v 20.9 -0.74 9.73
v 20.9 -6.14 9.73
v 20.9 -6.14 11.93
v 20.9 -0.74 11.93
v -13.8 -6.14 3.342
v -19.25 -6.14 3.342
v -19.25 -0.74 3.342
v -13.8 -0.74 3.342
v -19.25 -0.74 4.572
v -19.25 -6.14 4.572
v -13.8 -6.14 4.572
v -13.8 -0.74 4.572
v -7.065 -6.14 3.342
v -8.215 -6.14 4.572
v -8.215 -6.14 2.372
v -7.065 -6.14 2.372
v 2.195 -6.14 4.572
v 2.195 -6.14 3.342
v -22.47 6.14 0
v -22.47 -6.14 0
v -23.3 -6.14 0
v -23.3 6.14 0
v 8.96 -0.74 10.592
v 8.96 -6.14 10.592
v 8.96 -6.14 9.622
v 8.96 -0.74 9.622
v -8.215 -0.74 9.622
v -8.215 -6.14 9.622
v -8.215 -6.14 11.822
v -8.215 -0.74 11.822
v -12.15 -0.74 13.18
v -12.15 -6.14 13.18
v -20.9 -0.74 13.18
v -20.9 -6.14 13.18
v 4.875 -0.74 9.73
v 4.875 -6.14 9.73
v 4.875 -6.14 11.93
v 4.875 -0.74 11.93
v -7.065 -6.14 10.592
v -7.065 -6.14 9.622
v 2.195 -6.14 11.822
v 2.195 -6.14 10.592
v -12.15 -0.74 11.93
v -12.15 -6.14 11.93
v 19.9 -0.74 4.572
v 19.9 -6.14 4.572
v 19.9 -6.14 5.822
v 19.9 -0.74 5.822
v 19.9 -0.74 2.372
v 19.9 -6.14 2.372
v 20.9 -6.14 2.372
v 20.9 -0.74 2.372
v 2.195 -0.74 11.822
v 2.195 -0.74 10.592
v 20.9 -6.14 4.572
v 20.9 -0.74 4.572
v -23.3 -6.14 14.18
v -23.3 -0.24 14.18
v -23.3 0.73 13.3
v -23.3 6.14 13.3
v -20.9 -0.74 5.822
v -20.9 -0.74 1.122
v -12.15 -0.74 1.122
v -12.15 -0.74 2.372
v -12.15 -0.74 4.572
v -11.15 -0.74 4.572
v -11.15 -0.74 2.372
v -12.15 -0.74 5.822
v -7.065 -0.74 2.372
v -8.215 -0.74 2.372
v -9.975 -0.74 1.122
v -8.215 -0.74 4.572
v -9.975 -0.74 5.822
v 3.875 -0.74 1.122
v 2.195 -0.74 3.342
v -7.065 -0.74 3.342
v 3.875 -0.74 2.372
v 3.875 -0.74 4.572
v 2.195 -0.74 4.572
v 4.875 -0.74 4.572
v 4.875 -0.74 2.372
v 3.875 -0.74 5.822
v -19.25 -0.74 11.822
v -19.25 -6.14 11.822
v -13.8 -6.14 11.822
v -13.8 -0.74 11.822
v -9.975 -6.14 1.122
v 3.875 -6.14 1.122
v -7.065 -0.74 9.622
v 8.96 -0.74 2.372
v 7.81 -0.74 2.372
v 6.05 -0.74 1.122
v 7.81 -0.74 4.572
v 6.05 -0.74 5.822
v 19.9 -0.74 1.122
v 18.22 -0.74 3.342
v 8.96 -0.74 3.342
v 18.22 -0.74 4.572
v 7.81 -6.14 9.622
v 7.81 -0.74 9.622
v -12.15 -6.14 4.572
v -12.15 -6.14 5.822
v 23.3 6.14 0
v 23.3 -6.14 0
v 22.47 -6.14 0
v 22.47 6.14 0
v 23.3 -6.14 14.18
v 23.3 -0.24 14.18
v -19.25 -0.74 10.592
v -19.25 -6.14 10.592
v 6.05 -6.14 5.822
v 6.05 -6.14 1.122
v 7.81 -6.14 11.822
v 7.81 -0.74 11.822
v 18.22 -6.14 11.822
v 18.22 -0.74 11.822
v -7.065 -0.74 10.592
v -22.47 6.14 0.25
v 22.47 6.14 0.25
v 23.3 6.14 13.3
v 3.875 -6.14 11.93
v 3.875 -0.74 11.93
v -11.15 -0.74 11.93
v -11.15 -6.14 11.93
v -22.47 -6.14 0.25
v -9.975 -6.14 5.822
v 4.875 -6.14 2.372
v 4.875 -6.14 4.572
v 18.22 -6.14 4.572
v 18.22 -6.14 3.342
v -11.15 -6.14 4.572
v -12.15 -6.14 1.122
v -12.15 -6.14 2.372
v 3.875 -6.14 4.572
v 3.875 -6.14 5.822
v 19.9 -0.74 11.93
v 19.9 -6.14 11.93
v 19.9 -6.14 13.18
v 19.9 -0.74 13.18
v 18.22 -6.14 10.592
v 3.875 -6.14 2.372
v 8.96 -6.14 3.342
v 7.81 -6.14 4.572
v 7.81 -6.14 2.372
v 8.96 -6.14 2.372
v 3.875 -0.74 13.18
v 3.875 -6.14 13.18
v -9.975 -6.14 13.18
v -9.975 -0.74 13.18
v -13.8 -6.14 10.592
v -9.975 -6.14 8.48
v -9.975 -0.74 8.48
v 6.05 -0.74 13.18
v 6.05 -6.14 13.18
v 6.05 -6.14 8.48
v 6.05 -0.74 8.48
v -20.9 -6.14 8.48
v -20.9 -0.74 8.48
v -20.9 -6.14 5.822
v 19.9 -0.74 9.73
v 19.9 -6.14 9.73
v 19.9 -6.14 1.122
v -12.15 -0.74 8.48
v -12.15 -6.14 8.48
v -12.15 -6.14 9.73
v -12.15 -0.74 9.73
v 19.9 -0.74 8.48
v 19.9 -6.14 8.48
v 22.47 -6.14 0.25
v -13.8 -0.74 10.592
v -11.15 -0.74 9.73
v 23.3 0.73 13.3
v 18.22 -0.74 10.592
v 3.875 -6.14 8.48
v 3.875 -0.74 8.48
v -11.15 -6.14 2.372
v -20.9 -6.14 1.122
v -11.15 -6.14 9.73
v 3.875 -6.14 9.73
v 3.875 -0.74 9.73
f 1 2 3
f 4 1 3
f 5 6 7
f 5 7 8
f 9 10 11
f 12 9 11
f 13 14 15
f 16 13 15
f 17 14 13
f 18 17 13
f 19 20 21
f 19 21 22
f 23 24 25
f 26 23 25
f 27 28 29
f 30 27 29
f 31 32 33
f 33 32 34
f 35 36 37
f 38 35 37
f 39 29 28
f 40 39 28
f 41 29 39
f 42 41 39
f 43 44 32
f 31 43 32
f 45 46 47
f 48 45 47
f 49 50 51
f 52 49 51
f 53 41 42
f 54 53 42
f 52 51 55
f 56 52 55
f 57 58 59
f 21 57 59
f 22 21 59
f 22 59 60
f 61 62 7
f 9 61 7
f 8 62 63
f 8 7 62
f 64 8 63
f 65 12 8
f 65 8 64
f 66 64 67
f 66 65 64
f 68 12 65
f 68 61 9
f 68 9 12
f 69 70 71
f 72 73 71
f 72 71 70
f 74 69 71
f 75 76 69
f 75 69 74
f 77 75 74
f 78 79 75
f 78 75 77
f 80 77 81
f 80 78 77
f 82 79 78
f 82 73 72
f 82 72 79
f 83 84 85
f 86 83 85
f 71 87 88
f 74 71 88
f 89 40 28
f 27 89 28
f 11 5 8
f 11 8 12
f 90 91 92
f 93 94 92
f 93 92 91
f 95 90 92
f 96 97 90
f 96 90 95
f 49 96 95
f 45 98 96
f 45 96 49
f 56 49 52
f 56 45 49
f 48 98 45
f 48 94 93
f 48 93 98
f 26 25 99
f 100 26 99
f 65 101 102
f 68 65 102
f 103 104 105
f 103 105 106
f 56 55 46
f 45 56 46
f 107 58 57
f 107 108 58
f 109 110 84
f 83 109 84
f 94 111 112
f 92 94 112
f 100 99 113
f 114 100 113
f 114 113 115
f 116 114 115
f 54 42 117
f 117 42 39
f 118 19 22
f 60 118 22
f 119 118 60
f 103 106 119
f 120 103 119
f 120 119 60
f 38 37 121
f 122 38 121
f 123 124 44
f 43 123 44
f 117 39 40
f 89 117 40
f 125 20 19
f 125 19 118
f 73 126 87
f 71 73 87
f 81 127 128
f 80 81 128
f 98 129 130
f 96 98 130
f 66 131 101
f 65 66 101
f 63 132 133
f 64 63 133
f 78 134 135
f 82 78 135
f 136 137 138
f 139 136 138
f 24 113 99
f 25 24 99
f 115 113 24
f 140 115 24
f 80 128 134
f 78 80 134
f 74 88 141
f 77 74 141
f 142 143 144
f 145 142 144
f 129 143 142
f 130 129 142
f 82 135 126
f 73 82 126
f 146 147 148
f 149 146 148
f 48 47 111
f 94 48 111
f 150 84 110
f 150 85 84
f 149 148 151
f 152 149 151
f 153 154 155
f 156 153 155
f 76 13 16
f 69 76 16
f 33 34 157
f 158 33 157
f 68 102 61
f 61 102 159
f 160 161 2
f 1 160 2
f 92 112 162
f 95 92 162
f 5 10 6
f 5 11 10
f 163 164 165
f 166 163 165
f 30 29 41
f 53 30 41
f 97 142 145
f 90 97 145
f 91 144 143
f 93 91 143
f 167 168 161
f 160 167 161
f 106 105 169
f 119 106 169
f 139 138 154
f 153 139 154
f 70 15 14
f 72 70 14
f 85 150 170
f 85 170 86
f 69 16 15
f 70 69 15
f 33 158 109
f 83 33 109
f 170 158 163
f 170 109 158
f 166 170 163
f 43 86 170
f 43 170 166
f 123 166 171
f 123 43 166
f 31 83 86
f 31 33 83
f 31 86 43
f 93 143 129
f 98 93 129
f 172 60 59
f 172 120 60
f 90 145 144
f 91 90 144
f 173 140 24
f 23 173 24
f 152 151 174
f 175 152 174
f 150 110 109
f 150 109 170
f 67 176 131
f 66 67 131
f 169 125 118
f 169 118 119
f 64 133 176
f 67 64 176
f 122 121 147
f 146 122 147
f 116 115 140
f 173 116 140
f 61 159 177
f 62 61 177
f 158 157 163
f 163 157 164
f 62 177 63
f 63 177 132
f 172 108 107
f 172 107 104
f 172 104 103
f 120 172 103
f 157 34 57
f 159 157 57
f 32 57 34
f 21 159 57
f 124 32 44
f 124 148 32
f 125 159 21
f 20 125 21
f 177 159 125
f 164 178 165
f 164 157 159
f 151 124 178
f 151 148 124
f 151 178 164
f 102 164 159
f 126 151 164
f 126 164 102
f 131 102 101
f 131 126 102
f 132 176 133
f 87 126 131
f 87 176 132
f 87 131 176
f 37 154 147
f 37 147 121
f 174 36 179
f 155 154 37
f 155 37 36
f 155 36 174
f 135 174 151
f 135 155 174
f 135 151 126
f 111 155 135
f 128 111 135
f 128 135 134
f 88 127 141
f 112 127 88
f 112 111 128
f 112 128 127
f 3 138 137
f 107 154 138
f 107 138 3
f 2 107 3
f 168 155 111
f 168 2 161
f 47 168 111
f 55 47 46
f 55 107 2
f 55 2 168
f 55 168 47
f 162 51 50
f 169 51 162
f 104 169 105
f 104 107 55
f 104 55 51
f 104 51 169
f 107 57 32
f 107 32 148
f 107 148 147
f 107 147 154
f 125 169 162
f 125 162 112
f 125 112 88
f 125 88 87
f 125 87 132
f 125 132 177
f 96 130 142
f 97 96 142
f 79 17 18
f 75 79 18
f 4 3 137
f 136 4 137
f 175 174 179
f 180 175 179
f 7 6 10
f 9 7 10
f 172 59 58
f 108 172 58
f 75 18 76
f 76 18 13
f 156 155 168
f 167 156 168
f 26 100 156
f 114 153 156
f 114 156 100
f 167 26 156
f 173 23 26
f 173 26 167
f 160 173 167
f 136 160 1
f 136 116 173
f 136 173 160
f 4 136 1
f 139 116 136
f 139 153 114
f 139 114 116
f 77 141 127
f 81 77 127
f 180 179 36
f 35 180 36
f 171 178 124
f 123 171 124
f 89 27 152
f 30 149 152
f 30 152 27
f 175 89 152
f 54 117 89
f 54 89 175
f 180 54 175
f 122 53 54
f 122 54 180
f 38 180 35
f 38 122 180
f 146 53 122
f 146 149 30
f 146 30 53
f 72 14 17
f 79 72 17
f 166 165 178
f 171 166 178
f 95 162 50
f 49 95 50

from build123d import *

# Parameters (mm, degrees)
F1_DEPTH = 23.3
F2_W     = 44.94
F2_H     = 0.25
F3_DEPTH = 12.281
F4_W     = 5.45
F4_H     = 1.23
F5_DEPTH = 5.4


with BuildPart() as f1:
    # F0 (on Right) → F1 (new body, symmetric)
    with BuildSketch(Plane.YZ):
        Polygon((-0.24, 14.18), (-6.14, 14.18), (-6.14, 0), (6.14, 0), (6.14, 13.3), (0.73, 13.3), align=None)
    extrude(amount=F1_DEPTH, both=True)

    # F2 (on face) → F3 (cut, through all)
    with BuildSketch(Plane.XZ.offset(6.14)):
        with Locations((0, 0.125)):
            Rectangle(F2_W, F2_H)
    extrude(amount=-F3_DEPTH, mode=Mode.SUBTRACT)

    # F4 (on face) → F5 (cut)
    with BuildSketch(Plane.XZ.offset(6.14)):
        Polygon((-12.15, 5.822), (-20.9, 5.822), (-20.9, 1.122), (-12.15, 1.122), (-12.15, 2.372), (-11.15, 2.372), (-11.15, 4.572), (-12.15, 4.572), align=None)
        with Locations((-16.525, 3.957)):
            Rectangle(F4_W, F4_H, mode=Mode.SUBTRACT)
        Polygon((-9.975, 5.822), (-9.975, 1.122), (3.875, 1.122), (3.875, 2.372), (4.875, 2.372), (4.875, 4.572), (3.875, 4.572), (3.875, 5.822), align=None)
        Polygon((-8.215, 2.372), (-8.215, 4.572), (2.195, 4.572), (2.195, 3.342), (-7.065, 3.342), (-7.065, 2.372), align=None, mode=Mode.SUBTRACT)
        Polygon((6.05, 5.822), (6.05, 1.122), (19.9, 1.122), (19.9, 2.372), (20.9, 2.372), (20.9, 4.572), (19.9, 4.572), (19.9, 5.822), align=None)
        Polygon((7.81, 2.372), (7.81, 4.572), (18.22, 4.572), (18.22, 3.342), (8.96, 3.342), (8.96, 2.372), align=None, mode=Mode.SUBTRACT)
        Polygon((6.05, 8.48), (19.9, 8.48), (19.9, 9.73), (20.9, 9.73), (20.9, 11.93), (19.9, 11.93), (19.9, 13.18), (6.05, 13.18), align=None)
        Polygon((7.81, 11.822), (18.22, 11.822), (18.22, 10.592), (8.96, 10.592), (8.96, 9.622), (7.81, 9.622), align=None, mode=Mode.SUBTRACT)
        Polygon((3.875, 11.93), (3.875, 13.18), (-9.975, 13.18), (-9.975, 8.48), (3.875, 8.48), (3.875, 9.73), (4.875, 9.73), (4.875, 11.93), align=None)
        Polygon((-8.215, 11.822), (2.195, 11.822), (2.195, 10.592), (-7.065, 10.592), (-7.065, 9.622), (-8.215, 9.622), align=None, mode=Mode.SUBTRACT)
        Polygon((-12.15, 11.93), (-12.15, 13.18), (-20.9, 13.18), (-20.9, 8.48), (-12.15, 8.48), (-12.15, 9.73), (-11.15, 9.73), (-11.15, 11.93), align=None)
        with Locations((-16.525, 11.207)):
            Rectangle(F4_W, F4_H, mode=Mode.SUBTRACT)
    extrude(amount=-F5_DEPTH, mode=Mode.SUBTRACT)


solid = f1.part
